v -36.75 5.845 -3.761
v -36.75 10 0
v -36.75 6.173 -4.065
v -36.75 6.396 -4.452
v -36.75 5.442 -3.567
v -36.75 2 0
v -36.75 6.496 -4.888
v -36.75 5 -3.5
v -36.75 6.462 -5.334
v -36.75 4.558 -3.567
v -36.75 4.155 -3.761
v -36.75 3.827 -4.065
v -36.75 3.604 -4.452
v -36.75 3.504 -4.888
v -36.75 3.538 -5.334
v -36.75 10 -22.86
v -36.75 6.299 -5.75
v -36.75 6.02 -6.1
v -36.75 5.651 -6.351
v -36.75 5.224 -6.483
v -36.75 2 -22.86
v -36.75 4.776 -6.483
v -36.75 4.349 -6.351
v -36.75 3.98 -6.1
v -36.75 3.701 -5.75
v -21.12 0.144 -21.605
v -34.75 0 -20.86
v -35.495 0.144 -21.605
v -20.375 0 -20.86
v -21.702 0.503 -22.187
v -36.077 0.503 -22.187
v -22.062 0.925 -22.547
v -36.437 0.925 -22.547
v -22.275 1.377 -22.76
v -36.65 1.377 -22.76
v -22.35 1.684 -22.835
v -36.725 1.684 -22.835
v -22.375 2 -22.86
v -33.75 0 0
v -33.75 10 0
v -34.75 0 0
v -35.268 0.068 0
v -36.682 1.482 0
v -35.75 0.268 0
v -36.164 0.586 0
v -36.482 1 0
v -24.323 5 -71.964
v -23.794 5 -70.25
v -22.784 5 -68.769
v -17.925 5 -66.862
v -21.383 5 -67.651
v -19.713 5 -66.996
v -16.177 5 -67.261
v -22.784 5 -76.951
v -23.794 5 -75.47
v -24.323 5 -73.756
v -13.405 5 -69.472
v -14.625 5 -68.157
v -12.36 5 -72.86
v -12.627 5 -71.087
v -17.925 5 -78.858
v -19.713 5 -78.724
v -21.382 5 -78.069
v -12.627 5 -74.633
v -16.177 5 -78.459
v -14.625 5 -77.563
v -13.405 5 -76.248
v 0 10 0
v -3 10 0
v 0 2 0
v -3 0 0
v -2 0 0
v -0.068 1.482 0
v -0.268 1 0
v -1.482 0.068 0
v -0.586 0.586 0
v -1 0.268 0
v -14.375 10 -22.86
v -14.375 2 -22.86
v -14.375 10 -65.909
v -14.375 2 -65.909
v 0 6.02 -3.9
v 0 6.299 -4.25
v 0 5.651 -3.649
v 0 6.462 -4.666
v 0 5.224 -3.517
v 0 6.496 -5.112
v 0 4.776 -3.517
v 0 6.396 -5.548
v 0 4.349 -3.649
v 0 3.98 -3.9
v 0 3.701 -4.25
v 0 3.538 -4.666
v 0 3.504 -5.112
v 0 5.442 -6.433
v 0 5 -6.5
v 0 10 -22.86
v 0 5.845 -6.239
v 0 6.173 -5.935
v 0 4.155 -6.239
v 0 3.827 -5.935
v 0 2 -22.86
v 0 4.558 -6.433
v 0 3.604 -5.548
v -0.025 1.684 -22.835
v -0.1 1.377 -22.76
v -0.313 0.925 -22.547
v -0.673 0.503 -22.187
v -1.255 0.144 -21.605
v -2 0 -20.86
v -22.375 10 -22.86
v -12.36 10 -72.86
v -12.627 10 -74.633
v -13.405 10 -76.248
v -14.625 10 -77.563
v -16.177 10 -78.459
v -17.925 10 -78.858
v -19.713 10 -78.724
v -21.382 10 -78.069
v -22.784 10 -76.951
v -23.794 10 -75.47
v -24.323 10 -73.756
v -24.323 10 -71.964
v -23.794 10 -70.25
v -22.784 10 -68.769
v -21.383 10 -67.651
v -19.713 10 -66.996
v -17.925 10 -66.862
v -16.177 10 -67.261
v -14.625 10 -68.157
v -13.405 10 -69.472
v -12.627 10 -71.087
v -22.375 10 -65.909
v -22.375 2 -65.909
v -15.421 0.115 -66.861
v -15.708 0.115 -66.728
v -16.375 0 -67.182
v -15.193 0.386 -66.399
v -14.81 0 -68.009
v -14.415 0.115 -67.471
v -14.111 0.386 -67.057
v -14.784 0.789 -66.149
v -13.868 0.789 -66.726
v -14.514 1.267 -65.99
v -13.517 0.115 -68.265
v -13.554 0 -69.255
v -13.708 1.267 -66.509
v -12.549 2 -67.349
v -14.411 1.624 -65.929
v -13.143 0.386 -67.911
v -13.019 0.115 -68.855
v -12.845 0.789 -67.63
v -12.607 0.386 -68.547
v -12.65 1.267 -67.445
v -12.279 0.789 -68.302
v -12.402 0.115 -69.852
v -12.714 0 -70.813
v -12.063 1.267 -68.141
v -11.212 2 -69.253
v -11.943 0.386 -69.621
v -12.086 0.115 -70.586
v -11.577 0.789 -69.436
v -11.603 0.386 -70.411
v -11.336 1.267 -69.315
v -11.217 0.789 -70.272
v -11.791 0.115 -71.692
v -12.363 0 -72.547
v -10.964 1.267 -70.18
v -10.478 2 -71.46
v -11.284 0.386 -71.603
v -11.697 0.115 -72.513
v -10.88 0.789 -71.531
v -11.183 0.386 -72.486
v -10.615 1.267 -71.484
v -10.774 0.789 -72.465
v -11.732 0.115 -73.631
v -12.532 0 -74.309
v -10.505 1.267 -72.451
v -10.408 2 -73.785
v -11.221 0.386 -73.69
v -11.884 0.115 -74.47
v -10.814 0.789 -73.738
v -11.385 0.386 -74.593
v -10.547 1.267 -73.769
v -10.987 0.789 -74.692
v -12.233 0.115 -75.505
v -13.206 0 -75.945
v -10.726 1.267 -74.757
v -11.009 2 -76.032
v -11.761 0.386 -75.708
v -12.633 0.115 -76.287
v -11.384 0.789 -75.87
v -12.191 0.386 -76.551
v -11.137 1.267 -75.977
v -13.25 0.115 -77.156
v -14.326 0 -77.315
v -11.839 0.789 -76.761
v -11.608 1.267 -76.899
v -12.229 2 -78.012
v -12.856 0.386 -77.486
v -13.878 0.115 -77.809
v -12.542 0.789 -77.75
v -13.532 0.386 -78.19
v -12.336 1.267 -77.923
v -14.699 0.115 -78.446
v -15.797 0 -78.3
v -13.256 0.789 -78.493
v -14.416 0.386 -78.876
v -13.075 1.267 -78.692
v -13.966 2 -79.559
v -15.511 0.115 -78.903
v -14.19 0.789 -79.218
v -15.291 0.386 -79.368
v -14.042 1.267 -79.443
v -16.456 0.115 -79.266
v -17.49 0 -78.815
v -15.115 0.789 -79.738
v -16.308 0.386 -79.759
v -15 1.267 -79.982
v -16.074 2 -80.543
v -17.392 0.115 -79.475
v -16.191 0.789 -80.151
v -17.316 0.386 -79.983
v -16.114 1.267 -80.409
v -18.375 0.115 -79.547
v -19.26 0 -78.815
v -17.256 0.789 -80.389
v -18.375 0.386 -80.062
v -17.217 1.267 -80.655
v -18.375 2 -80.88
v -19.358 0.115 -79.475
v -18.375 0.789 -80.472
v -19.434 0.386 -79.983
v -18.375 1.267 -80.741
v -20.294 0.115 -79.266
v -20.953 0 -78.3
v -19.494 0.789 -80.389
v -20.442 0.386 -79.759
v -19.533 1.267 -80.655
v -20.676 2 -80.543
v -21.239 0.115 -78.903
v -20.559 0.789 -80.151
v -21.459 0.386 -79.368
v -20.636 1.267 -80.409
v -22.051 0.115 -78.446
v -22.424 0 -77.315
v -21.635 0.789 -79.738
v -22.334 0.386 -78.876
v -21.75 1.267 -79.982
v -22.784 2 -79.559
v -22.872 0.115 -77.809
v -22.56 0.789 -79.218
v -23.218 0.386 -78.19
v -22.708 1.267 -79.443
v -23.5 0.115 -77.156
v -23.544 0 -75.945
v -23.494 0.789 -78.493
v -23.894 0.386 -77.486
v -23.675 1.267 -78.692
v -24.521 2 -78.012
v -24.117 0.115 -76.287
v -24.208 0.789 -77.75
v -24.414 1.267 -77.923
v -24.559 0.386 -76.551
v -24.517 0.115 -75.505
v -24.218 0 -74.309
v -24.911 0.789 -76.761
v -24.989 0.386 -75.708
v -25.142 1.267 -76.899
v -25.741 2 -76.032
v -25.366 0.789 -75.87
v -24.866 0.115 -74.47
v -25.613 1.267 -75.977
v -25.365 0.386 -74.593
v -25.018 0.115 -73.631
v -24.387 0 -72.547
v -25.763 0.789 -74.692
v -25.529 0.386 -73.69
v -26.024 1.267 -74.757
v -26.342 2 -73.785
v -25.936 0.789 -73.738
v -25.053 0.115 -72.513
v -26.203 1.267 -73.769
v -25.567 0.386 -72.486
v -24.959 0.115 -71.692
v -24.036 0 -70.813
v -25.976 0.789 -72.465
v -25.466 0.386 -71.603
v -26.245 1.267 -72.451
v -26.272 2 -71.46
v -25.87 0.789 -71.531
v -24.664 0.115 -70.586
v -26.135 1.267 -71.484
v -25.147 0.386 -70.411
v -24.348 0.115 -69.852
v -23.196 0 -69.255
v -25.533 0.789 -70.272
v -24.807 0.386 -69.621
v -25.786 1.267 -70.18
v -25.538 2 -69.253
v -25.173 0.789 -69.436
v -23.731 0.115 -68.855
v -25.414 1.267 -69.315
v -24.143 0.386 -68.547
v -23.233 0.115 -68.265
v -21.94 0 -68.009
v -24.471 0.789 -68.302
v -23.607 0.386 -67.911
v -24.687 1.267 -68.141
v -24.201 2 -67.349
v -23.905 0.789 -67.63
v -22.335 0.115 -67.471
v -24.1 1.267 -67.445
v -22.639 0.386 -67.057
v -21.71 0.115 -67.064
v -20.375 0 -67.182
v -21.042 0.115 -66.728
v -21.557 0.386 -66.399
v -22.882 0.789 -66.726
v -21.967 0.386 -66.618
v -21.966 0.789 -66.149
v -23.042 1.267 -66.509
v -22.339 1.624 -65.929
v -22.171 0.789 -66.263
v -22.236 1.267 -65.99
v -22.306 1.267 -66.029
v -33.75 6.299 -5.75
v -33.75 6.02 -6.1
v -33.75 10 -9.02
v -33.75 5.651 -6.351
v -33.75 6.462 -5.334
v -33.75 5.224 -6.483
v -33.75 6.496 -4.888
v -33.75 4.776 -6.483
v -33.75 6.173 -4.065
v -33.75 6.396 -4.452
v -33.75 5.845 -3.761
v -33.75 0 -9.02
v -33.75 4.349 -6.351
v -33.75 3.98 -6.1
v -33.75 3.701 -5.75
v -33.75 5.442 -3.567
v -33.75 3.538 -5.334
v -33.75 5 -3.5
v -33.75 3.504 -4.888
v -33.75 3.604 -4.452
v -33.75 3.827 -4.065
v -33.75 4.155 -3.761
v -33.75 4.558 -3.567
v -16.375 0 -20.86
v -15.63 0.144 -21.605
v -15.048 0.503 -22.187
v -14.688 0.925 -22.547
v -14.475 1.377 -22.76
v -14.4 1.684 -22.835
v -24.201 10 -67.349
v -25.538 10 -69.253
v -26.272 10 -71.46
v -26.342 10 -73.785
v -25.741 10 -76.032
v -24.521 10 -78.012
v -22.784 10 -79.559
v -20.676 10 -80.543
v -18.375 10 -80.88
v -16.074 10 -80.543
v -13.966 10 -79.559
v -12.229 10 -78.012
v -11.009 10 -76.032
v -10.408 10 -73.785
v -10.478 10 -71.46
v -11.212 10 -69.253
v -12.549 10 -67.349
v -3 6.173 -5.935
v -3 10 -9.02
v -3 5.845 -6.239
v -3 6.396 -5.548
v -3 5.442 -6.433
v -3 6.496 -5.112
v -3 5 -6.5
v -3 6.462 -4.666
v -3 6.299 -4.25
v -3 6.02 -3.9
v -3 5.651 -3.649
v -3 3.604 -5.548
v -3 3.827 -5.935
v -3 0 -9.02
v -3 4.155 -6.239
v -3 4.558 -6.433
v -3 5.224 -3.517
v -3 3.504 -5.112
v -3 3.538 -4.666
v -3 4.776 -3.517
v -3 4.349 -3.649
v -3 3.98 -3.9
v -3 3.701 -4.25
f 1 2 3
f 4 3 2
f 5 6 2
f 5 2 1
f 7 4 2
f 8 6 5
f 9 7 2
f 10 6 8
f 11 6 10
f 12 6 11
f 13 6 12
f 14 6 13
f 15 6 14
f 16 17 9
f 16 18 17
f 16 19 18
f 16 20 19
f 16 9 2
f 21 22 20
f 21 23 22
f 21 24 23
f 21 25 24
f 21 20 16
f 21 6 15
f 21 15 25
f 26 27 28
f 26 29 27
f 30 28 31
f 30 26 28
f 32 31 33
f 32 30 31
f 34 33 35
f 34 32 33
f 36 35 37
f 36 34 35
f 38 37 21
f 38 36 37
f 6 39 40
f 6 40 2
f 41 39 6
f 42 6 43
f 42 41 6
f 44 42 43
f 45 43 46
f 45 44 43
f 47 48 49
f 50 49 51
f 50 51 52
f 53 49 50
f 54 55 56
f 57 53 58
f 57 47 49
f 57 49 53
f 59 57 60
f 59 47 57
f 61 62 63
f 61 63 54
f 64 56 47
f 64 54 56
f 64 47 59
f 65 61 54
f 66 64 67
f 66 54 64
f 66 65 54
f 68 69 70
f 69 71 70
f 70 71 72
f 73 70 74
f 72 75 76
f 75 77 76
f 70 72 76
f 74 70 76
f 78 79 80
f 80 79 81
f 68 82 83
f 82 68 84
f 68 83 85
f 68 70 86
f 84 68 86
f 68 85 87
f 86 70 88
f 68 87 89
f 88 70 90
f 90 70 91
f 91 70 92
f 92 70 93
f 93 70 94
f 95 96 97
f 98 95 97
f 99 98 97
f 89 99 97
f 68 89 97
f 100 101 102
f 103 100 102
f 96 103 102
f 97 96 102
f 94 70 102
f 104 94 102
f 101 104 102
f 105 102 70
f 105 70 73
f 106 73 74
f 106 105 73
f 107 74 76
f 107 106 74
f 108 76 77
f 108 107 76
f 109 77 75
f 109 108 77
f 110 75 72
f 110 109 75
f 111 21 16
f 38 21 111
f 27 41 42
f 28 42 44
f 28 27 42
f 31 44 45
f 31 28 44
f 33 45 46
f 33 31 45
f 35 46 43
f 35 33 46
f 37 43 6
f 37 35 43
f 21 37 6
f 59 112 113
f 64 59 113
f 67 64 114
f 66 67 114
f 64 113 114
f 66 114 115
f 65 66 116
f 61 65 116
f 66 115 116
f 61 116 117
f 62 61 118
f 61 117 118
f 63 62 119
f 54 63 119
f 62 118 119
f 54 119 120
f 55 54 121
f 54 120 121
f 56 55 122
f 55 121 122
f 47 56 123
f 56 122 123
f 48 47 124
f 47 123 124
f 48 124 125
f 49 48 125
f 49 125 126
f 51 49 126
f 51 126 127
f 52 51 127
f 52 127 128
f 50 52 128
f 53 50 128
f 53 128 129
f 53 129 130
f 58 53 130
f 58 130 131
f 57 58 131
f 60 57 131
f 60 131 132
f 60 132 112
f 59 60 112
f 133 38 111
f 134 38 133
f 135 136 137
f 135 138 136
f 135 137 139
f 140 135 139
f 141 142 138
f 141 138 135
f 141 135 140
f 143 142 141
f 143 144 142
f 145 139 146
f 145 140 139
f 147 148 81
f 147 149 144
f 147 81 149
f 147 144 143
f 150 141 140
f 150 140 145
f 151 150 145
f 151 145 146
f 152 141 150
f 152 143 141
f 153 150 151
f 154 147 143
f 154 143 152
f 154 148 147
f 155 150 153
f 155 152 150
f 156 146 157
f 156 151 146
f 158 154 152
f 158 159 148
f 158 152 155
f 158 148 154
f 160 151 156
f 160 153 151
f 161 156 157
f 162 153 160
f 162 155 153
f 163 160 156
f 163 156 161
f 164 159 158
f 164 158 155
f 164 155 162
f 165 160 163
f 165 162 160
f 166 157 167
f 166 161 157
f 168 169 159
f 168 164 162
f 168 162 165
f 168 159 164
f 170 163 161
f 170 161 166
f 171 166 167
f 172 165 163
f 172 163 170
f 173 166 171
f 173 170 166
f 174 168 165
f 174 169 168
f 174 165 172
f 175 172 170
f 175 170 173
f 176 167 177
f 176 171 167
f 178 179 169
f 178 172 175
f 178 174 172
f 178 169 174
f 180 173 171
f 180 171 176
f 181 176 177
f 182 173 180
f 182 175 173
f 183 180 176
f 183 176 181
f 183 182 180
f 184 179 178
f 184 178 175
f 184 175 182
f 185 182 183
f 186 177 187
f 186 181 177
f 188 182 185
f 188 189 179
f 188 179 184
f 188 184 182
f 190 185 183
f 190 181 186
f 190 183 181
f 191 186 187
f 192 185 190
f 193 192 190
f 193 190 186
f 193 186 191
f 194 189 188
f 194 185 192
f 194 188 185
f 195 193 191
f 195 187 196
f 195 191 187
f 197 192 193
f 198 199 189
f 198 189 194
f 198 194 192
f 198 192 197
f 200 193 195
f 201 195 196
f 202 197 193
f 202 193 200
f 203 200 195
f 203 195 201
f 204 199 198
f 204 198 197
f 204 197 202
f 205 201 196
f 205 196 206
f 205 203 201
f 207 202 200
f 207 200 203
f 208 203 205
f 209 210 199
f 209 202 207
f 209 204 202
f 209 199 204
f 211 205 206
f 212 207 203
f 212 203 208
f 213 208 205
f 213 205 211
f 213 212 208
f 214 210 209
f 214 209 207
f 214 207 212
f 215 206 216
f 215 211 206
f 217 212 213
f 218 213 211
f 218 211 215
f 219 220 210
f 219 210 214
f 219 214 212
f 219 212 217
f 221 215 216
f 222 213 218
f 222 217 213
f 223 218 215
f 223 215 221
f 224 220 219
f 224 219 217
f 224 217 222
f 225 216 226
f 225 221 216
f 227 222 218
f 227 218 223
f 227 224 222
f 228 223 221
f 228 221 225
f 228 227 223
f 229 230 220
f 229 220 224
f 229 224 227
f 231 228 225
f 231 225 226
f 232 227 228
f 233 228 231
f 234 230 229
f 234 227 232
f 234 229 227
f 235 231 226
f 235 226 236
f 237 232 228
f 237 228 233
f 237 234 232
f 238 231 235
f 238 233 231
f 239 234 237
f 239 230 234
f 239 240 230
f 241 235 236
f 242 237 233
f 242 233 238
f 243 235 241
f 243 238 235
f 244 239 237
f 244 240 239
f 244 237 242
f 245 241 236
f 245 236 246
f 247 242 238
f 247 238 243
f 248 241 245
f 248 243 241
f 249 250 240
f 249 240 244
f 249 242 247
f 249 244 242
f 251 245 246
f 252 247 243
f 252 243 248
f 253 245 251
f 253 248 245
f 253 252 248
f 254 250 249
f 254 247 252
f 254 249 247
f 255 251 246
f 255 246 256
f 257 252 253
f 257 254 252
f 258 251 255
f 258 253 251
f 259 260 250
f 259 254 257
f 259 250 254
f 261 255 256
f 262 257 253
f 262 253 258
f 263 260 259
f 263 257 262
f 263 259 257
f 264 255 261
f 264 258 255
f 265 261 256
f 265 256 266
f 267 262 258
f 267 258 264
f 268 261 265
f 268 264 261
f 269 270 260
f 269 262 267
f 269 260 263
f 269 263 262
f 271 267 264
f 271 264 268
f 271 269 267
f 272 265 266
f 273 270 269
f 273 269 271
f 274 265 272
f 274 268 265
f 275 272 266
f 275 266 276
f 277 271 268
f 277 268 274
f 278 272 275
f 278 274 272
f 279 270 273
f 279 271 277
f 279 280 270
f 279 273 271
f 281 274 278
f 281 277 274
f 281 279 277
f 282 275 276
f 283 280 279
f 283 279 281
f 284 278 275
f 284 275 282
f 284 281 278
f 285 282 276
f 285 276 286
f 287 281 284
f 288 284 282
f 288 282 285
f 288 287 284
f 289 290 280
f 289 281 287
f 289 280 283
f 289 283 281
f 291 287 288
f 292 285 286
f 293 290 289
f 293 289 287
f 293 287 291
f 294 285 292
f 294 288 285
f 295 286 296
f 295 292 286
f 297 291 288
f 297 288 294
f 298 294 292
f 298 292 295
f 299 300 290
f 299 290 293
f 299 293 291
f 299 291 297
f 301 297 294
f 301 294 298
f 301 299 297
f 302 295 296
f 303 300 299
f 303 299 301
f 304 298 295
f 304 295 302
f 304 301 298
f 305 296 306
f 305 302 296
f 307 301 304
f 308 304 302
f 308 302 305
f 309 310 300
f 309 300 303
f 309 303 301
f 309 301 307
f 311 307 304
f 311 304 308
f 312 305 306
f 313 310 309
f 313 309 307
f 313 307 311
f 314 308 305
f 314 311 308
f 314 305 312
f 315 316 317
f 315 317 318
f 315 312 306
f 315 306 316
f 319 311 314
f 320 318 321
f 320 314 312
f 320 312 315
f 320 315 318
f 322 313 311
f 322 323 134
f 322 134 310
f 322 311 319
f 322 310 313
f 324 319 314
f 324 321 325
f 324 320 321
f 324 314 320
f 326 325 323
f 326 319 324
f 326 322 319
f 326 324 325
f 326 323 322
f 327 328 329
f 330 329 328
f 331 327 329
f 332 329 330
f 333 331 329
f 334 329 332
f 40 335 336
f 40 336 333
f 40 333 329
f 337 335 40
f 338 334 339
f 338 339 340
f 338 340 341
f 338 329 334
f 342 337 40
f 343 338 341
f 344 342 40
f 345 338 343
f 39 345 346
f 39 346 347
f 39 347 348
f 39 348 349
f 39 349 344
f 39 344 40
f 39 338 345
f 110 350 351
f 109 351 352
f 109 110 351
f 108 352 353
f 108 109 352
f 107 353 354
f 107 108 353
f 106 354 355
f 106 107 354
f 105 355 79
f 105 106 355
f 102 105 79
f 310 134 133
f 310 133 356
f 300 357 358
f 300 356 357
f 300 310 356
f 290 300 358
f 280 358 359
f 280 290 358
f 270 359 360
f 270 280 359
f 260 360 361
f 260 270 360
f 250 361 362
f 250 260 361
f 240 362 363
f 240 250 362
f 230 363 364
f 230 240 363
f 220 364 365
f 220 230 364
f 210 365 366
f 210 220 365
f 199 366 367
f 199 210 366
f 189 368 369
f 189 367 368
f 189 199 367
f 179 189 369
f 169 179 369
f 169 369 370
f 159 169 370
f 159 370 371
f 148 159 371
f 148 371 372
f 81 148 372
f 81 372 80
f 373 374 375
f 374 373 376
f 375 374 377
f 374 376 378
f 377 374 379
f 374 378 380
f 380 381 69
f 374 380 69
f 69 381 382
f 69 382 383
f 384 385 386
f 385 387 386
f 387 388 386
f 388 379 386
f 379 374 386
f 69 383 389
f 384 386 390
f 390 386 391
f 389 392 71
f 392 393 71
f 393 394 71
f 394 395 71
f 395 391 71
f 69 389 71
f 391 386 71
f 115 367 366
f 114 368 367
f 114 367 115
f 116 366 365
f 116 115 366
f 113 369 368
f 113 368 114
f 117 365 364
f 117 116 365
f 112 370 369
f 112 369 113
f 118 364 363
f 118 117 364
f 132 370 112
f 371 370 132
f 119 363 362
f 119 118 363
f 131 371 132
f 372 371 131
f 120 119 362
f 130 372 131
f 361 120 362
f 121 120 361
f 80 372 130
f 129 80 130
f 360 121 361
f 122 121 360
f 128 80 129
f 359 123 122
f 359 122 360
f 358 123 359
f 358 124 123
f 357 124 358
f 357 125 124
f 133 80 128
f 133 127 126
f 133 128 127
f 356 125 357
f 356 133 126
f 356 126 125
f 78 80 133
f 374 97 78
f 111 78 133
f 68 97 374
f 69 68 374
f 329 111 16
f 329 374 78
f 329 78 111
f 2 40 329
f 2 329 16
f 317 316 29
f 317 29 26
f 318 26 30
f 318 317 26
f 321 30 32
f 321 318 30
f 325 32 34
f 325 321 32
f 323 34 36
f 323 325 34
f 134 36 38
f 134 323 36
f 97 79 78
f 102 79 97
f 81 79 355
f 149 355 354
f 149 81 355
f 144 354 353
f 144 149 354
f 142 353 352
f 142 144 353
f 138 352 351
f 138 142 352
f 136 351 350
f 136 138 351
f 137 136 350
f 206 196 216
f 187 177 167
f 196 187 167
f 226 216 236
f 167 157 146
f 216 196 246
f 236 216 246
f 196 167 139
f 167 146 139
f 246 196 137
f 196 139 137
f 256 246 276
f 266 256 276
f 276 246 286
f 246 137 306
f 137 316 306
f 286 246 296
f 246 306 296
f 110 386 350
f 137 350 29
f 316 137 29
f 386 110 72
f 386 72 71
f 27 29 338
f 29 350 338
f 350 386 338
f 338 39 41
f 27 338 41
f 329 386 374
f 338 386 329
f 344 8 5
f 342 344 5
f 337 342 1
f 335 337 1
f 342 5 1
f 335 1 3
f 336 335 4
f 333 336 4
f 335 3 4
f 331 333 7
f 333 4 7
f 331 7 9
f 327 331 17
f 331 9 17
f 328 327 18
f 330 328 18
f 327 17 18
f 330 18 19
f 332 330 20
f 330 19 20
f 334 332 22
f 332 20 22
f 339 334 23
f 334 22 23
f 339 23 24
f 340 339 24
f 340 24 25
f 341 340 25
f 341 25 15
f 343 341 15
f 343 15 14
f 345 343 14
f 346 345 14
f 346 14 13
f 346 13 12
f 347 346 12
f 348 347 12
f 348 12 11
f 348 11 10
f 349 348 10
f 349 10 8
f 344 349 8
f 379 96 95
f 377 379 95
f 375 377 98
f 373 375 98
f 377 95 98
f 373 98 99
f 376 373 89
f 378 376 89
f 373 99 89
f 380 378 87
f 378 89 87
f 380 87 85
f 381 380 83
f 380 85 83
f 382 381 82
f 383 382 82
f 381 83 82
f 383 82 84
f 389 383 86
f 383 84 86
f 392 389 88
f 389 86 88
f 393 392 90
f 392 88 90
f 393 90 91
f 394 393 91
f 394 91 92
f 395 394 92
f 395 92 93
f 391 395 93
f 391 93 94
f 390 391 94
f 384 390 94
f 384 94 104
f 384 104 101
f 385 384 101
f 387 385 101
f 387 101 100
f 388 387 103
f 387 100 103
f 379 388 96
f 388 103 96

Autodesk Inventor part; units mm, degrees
ref_plane "YZ Plane" through (0, 0, 0) normal (1, 0, 0) x (0, 1, 0)
ref_plane "XZ Plane" through (0, 0, 0) normal (0, 1, 0) x (-1, 0, 0)
ref_plane "XY Plane" through (0, 0, 0) normal (0, 0, 1) x (1, 0, 0)
sketch "Sketch1" plane through (0, 0, 0) normal (0, 1, 0) x (-1, 0, 0)
  line L0 (3, -9.02) -> (33.75, -9.02)
  line L1 (33.75, -9.02) -> (33.75, 0)
  line L2 (33.75, 0) -> (36.75, 0)
  line L3 (36.75, 0) -> (36.75, -22.86)
  line L4 (36.75, -22.86) -> (22.375, -22.86)
  line L5 (22.375, -22.86) -> (22.375, -65.9087)
  line L6 (14.375, -22.86) -> (14.375, -65.9087)
  line L7 (18.375, -22.86) -> (18.375, -72.86) construction
  arc A0 (14.375, -65.9087) -> (22.375, -65.9087) centre (18.375, -72.86) ccw
  line L8 (3, -9.02) -> (3, 0)
  line L9 (3, 0) -> (0, 0)
  line L10 (0, 0) -> (0, -22.86)
  line L11 (14.375, -22.86) -> (0, -22.86)
  dimension "d2" = 30.75
  dimension "d3" = 3
  dimension "d4" = 22.86
  dimension "d9" = 8
  dimension "d12" = 4
  dimension "d13" = 8.02
  dimension "d15" = 14.375
  dimension "d16" = 3
  dimension "d17" = 22.86
extrude "Extrusion1" add sketch "Sketch1" along normal blind 10
sketch "Sketch2" plane through (0, 0, 0) normal (1, 0, 0) x (0, 0, -1)
  circle A0 centre (5, 5) radius 1.5
  line L0 (0, 0) -> (0, 10) projected
  line L1 (0, 10) -> (22.86, 10) projected
  dimension "d23" = 5
  dimension "d24" = 5
  dimension "d25" = 3
extrude "Extrusion2" cut sketch "Sketch2" against normal blind 3
sketch "Sketch3" plane through (-36.75, 0, -22.86) normal (-1, 0, 0) x (0, 0, 1)
  circle A0 centre (17.86, 5) radius 1.5 projected
  circle A1 centre (17.86, 5) radius 1.5
  point P0 (22.86, 0)
extrude "Extrusion3" cut sketch "Sketch3" against normal blind 3
sketch "Sketch4" plane through (0, 10, 0) normal (0, 1, 0) x (1, 0, 0)
  arc A0 (-14.375, 65.9087) -> (-22.375, 65.9087) centre (-18.375, 72.86) ccw projected
  circle A1 centre (-18.375, 72.86) radius 6.015
  point P0 (0, 0)
  dimension "d30" = 12.03
extrude "Extrusion4" cut sketch "Sketch4" against normal blind 5
fillet "Fillet1" radius 2 7 edges at (-18.375, 0, -80.88) (-14.375, 0, -44.3844) (-7.1875, 0, -22.86) (-29.5625, 0, -22.86) (0, 0, -11.43) (-36.75, 0, -11.43) (-22.375, 0, -44.3844)
properties part number "Tarea 16 P2"
